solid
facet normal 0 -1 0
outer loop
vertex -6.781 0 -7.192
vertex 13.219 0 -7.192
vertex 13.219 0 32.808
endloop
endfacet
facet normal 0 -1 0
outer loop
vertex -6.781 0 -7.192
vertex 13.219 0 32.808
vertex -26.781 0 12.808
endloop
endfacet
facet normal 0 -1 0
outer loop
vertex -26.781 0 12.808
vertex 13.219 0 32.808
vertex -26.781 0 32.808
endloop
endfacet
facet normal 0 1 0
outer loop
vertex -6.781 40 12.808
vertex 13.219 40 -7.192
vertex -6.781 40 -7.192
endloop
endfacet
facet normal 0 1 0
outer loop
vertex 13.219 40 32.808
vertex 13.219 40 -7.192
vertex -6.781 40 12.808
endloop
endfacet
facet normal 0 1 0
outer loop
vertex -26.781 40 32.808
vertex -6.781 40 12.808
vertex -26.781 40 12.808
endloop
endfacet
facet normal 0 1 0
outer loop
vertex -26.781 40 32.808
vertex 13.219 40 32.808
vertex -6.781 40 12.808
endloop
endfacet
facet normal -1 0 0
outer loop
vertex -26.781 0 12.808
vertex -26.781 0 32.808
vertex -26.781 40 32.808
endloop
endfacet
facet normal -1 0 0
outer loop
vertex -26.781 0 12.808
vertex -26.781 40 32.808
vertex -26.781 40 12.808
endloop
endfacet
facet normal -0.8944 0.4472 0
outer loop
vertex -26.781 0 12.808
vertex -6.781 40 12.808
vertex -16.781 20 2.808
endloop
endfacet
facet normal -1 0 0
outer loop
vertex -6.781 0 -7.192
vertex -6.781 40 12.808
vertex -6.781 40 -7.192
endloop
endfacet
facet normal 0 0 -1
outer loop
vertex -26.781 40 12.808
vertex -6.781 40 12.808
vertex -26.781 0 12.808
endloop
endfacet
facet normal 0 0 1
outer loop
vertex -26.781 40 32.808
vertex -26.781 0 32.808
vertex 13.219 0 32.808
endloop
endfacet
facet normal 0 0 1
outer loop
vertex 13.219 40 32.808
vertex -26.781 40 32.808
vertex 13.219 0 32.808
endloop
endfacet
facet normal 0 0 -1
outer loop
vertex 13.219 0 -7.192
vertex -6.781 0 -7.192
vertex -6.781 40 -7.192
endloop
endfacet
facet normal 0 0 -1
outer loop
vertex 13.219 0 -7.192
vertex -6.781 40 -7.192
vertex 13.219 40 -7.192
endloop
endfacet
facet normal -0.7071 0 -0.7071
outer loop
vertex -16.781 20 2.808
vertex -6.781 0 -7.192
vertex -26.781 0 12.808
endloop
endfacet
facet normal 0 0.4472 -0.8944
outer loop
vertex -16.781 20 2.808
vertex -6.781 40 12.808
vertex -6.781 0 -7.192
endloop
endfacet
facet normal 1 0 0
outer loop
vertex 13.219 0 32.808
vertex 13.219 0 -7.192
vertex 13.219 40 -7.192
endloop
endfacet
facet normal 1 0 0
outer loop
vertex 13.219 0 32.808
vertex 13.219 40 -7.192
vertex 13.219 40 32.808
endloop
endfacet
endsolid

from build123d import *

# Parameters (mm, degrees)
EXTRUDE_1_DEPTH     = 40
EXTRUDE_2_DEPTH     = 40
CUT_EXTRUDE_1_DEPTH = 40
CUT_EXTRUDE_2_DEPTH = 40


with BuildPart() as part:
    # 草图1 → 凸台-拉伸1 (new body)
    with BuildSketch(Plane(origin=(0, 0, 0), x_dir=(1, 0, 0), z_dir=(0, 1, 0))):
        Polygon((-6.780821918, 7.191780822), (13.219178082, 7.191780822), (13.219178082, -32.808219178), (-6.780821918, -32.808219178), (-26.780821918, -32.808219178), (-26.780821918, -12.808219178), (-6.780821918, -12.808219178), align=None)
    extrude(amount=EXTRUDE_1_DEPTH)

    # 草图2 → 凸台-拉伸2 (add)
    with BuildSketch(Plane.XZ):
        Polygon((-6.780821918, -7.191780822), (-26.780821918, 12.808219178), (-6.780821918, 12.808219178), align=None)
    extrude(amount=-EXTRUDE_2_DEPTH)

    # 草图3 → 切除-拉伸1 (cut)
    with BuildSketch(Plane.XY.offset(12.808219178)):
        Polygon((-6.780821918, 40), (-26.780821918, 0), (-26.780821918, 40), align=None)
    extrude(amount=-CUT_EXTRUDE_1_DEPTH, mode=Mode.SUBTRACT)

    # 草图4 → 切除-拉伸2 (cut)
    with BuildSketch(Plane(origin=(-6.780821918, 0, 0), x_dir=(0, 0, -1), z_dir=(1, 0, 0))):
        Polygon((-12.808219178, 40), (7.191780822, 0), (7.191780822, 40), align=None)
    extrude(amount=-CUT_EXTRUDE_2_DEPTH, mode=Mode.SUBTRACT)


solid = part.part
